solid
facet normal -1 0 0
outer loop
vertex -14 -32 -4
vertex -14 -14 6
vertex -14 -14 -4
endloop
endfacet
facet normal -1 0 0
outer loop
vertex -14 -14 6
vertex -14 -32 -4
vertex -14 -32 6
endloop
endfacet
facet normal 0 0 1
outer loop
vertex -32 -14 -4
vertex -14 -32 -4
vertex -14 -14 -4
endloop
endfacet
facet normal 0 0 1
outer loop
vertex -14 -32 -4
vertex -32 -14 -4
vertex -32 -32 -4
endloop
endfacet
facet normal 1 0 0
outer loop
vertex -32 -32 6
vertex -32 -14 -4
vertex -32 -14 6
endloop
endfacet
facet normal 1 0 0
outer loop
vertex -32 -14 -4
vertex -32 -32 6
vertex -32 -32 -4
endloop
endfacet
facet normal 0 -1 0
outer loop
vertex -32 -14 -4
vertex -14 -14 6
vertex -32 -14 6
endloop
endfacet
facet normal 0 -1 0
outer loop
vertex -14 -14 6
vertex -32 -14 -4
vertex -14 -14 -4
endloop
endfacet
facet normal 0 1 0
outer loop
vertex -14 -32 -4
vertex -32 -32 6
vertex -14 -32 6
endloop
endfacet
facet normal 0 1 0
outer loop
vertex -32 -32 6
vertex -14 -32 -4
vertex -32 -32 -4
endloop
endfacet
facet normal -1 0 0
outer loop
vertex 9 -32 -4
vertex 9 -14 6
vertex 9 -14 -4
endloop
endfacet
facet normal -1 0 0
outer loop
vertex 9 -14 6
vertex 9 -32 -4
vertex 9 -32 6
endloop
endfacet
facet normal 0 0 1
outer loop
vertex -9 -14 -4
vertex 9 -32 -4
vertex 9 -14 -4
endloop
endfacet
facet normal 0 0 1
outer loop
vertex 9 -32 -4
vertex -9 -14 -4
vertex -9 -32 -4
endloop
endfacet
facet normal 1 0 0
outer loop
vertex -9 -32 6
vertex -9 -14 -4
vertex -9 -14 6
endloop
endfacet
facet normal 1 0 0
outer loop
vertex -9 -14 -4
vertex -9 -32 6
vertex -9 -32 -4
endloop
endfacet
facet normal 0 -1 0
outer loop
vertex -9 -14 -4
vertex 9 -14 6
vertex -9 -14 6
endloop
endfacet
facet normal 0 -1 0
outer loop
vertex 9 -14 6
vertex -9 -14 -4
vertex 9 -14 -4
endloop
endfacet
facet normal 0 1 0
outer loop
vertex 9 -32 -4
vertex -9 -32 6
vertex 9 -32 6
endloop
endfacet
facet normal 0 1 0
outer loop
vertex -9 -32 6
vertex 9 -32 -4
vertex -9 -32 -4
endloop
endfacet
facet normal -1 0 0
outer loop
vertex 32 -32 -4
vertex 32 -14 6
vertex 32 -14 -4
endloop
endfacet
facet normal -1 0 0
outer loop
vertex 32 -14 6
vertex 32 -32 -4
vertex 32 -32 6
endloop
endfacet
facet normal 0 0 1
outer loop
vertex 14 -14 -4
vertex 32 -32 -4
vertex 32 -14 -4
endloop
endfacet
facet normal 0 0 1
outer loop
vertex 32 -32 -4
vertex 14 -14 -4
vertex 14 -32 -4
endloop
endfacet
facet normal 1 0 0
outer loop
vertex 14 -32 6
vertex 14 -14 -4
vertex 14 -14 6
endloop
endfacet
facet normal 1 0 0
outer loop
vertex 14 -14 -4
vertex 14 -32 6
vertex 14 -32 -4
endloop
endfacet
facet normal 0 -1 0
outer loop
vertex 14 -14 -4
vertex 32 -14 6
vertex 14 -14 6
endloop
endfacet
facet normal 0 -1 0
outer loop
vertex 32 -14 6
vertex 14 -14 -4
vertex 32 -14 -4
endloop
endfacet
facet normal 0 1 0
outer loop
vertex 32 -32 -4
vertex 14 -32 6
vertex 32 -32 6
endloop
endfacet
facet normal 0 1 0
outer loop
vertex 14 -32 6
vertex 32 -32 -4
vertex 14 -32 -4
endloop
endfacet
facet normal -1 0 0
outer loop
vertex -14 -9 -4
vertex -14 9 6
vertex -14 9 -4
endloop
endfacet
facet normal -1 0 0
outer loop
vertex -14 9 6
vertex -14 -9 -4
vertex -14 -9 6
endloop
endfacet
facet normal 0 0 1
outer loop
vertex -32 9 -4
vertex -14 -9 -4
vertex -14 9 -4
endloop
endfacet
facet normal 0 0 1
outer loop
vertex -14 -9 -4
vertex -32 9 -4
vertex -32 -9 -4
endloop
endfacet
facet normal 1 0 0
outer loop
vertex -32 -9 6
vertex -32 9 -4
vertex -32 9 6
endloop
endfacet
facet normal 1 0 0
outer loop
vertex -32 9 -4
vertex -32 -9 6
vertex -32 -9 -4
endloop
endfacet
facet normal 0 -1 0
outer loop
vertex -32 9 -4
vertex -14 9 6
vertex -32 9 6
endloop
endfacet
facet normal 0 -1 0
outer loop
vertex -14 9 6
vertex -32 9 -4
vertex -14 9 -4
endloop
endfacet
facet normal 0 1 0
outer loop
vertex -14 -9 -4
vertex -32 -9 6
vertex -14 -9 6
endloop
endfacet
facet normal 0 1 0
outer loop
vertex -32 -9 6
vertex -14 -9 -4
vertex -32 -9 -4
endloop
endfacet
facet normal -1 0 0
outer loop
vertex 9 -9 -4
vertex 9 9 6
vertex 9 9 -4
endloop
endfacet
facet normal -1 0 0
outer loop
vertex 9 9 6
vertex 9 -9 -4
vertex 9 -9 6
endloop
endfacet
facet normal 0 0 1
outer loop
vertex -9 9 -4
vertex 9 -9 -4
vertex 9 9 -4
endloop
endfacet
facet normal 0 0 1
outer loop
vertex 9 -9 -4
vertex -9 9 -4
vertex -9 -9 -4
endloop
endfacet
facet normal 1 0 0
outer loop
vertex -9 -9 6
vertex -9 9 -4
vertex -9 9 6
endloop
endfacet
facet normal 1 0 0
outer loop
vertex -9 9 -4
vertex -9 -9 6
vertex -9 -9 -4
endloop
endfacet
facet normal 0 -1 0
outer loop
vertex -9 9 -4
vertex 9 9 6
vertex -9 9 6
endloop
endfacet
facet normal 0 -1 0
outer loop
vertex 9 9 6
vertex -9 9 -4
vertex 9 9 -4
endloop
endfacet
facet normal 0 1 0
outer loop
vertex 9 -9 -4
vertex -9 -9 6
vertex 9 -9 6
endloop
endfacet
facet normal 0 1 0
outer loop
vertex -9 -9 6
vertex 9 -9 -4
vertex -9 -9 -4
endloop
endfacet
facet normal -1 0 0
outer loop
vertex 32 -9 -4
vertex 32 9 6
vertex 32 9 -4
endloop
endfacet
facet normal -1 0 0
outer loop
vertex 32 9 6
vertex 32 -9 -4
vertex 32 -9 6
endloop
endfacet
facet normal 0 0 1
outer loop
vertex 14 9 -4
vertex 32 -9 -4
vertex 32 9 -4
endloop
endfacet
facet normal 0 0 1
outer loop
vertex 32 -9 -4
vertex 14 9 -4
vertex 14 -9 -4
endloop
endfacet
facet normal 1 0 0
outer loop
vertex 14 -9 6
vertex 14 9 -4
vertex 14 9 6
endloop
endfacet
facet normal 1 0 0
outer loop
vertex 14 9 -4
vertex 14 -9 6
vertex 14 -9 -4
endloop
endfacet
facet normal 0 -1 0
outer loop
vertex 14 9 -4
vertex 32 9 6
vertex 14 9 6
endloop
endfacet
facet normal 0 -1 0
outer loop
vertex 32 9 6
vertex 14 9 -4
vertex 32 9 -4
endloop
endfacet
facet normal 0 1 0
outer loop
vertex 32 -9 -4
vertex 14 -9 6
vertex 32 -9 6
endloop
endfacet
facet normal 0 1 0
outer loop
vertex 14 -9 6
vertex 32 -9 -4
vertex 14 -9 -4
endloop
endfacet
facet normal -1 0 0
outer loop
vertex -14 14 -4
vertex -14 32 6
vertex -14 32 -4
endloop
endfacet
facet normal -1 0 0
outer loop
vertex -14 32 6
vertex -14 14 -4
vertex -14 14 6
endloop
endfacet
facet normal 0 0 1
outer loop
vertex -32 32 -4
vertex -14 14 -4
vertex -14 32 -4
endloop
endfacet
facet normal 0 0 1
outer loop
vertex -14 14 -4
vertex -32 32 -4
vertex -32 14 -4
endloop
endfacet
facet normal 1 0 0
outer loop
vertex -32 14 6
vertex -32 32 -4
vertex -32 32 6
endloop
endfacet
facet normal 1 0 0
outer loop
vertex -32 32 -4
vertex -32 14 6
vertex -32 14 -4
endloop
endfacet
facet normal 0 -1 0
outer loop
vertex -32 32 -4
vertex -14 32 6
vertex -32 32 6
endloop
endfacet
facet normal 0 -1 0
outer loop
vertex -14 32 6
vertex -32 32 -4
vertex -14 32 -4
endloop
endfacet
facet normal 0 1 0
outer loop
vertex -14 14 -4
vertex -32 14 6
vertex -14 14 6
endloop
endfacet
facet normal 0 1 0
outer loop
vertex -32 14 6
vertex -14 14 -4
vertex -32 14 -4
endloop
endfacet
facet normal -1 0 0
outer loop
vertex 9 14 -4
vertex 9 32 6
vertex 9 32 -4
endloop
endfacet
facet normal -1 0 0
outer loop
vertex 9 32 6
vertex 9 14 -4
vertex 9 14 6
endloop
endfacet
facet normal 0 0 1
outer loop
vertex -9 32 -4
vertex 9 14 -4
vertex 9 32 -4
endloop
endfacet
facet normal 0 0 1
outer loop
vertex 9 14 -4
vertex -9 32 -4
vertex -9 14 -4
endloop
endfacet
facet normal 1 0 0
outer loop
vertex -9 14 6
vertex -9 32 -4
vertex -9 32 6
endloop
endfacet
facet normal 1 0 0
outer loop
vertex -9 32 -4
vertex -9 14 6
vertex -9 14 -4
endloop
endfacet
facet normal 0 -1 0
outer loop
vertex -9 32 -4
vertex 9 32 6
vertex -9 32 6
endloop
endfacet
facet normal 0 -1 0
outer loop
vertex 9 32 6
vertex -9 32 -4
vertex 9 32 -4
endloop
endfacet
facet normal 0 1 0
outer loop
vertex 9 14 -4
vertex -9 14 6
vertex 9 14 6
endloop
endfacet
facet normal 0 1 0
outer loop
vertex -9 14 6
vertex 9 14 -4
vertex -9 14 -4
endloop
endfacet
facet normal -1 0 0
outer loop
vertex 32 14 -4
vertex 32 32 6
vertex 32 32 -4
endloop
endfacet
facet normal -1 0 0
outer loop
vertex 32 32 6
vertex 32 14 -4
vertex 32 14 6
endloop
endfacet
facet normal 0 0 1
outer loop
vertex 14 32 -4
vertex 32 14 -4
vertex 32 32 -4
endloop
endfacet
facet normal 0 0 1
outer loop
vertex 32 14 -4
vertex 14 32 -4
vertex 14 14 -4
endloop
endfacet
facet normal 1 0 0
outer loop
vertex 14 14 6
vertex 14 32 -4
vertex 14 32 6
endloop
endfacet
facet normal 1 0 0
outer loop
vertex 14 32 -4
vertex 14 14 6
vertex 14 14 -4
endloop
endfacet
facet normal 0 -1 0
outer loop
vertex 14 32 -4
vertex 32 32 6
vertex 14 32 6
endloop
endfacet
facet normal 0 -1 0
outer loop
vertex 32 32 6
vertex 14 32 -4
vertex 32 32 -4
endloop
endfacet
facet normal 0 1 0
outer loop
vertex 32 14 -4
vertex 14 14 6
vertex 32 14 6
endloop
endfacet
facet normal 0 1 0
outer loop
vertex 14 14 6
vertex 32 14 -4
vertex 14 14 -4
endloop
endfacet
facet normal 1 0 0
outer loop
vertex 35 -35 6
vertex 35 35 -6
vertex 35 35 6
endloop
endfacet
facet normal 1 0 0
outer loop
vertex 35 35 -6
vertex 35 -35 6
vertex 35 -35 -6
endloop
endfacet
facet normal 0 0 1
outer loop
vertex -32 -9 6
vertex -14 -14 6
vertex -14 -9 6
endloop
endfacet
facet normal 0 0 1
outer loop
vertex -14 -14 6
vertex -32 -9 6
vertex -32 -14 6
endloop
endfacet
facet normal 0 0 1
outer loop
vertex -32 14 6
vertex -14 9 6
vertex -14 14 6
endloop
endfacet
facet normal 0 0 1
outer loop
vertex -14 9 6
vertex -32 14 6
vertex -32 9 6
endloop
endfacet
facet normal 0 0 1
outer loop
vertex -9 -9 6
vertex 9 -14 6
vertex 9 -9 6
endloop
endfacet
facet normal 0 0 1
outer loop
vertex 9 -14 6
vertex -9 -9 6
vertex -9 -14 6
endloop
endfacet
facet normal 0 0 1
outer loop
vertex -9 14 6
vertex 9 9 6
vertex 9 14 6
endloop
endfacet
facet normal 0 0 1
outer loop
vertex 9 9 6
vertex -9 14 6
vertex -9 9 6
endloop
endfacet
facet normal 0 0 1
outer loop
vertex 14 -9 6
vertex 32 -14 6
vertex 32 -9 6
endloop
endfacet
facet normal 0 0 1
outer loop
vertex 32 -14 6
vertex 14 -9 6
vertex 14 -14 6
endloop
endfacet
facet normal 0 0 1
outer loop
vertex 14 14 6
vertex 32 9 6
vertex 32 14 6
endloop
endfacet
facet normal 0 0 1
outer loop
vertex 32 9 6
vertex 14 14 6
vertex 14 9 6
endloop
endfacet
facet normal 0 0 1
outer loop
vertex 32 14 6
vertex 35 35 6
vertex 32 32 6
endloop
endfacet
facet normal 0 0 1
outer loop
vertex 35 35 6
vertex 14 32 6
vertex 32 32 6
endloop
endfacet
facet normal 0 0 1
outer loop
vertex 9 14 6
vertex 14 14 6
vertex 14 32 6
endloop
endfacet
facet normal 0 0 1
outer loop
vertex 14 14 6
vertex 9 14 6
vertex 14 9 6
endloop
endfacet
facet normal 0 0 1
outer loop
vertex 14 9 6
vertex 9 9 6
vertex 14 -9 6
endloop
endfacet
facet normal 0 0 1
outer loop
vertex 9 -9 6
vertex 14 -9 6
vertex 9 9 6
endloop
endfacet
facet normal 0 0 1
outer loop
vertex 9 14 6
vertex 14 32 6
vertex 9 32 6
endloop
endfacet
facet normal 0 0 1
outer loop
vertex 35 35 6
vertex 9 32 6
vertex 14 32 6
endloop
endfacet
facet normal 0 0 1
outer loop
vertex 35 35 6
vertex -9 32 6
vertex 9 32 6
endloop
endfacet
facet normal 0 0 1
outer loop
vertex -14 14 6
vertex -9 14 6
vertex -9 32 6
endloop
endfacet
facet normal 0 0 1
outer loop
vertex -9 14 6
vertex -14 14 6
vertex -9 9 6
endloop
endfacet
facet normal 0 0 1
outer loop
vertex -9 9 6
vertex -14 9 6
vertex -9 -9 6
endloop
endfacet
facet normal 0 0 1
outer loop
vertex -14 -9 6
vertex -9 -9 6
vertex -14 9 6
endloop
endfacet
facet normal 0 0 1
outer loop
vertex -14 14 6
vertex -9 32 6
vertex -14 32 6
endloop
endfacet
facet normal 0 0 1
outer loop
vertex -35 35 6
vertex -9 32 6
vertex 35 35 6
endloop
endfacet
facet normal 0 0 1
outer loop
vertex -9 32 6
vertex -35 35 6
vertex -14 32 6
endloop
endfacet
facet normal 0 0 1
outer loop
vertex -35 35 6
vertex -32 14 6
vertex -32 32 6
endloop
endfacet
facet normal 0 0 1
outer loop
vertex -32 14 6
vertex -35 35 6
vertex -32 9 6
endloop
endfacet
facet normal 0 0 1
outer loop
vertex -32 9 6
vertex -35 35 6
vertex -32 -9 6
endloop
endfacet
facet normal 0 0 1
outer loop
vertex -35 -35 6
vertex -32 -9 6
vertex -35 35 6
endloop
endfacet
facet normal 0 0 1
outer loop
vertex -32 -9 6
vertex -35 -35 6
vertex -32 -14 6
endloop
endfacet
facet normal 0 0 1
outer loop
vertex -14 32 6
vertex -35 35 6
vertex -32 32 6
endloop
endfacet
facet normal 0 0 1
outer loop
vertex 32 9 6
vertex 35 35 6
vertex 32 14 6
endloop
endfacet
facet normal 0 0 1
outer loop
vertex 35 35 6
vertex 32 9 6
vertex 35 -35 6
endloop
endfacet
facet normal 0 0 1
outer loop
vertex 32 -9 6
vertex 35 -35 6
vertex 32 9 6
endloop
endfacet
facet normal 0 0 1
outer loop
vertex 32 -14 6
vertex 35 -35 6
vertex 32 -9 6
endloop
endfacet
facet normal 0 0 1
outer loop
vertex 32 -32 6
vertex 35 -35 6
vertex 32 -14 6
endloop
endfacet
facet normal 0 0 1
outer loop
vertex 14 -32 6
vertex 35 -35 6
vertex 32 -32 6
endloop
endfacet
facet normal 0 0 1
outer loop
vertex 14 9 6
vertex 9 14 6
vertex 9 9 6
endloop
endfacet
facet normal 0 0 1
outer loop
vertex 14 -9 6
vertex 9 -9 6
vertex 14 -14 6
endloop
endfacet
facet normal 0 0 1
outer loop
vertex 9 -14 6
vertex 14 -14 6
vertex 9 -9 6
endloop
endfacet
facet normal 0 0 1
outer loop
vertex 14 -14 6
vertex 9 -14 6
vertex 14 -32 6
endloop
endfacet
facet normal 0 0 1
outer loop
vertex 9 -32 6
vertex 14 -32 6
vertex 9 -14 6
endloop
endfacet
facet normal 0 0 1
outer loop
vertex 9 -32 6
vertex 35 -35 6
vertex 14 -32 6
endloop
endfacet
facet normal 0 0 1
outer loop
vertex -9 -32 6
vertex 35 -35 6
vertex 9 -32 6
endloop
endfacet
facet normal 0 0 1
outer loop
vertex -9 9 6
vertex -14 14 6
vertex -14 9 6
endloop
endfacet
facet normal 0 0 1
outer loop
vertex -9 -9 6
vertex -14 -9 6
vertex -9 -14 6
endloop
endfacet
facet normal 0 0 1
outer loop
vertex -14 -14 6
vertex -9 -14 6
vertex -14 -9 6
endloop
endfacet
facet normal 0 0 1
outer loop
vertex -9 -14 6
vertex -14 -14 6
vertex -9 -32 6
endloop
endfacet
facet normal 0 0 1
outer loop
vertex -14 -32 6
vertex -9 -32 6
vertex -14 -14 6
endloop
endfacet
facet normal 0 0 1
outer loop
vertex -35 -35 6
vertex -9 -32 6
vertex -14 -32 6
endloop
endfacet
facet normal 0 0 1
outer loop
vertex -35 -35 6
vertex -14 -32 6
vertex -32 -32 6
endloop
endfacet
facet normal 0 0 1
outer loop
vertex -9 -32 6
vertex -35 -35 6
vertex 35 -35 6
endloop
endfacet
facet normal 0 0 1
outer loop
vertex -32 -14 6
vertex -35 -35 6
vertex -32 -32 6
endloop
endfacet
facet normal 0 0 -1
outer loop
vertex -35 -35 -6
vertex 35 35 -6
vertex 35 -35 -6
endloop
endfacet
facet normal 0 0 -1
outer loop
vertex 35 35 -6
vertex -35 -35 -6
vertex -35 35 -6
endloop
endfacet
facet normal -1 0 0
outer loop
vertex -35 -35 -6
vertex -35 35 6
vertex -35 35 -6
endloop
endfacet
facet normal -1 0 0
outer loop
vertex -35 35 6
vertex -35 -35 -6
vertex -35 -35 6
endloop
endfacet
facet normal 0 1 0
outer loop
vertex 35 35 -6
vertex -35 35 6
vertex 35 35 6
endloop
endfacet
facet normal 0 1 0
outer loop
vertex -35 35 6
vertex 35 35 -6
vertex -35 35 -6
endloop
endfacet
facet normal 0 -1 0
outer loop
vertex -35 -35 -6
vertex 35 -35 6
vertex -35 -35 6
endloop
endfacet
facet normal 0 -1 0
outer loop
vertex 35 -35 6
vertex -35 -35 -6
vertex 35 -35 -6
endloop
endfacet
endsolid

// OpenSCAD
$fn = 32;

// ----------------------------------------------------------------------
// Pocket plate 70 x 70 x 12
// 3 x 3 pockets 18 mm square, 10 mm deep
// ----------------------------------------------------------------------

// --- parameters (mm) ---
thickness = 12;  // plate thickness
floor_t = 2;     // material left under each pocket
pocket = 18;     // pocket side length
pitch_x = 23;    // pocket pitch along X
pitch_y = 23;    // pocket pitch along Y
cols = 3;        // pockets per row
rows = 3;        // rows of pockets

// --- derived feature positions (mm) ---
depth = thickness - floor_t;        // = 10   pocket depth, down to the floor
span_x = (cols - 1) * pitch_x;      // = 46   distance between outer pockets
span_y = (rows - 1) * pitch_y;      // = 46   distance between outer pocket rows
origin_x = -span_x / 2;             // = -23   X of the first pocket
origin_y = -span_y / 2;             // = -23   Y of the first pocket
plate = [span_x + pocket + 6, span_y + pocket + 6, thickness];  // = [70, 70, 12]   overall size: pockets plus 3 mm of wall on each side
feature_centers = [
  [origin_x + 0 * pitch_x, origin_y + 0 * pitch_y],
  [origin_x + 1 * pitch_x, origin_y + 0 * pitch_y],
  [origin_x + 2 * pitch_x, origin_y + 0 * pitch_y],
  [origin_x + 0 * pitch_x, origin_y + 1 * pitch_y],
  [origin_x + 1 * pitch_x, origin_y + 1 * pitch_y],
  [origin_x + 2 * pitch_x, origin_y + 1 * pitch_y],
  [origin_x + 0 * pitch_x, origin_y + 2 * pitch_y],
  [origin_x + 1 * pitch_x, origin_y + 2 * pitch_y],
  [origin_x + 2 * pitch_x, origin_y + 2 * pitch_y]
];   // pocket centres, used verbatim by the cutter loop

// plate outline, then one pocket per centre in feature_centers
difference() {
  cube(plate, center = true);
  for (centre = feature_centers)
    translate([centre[0] - pocket / 2, centre[1] - pocket / 2, plate[2] / 2 - depth])
      cube([pocket, pocket, depth + 1]);  // centred on the declared pocket centre
}
